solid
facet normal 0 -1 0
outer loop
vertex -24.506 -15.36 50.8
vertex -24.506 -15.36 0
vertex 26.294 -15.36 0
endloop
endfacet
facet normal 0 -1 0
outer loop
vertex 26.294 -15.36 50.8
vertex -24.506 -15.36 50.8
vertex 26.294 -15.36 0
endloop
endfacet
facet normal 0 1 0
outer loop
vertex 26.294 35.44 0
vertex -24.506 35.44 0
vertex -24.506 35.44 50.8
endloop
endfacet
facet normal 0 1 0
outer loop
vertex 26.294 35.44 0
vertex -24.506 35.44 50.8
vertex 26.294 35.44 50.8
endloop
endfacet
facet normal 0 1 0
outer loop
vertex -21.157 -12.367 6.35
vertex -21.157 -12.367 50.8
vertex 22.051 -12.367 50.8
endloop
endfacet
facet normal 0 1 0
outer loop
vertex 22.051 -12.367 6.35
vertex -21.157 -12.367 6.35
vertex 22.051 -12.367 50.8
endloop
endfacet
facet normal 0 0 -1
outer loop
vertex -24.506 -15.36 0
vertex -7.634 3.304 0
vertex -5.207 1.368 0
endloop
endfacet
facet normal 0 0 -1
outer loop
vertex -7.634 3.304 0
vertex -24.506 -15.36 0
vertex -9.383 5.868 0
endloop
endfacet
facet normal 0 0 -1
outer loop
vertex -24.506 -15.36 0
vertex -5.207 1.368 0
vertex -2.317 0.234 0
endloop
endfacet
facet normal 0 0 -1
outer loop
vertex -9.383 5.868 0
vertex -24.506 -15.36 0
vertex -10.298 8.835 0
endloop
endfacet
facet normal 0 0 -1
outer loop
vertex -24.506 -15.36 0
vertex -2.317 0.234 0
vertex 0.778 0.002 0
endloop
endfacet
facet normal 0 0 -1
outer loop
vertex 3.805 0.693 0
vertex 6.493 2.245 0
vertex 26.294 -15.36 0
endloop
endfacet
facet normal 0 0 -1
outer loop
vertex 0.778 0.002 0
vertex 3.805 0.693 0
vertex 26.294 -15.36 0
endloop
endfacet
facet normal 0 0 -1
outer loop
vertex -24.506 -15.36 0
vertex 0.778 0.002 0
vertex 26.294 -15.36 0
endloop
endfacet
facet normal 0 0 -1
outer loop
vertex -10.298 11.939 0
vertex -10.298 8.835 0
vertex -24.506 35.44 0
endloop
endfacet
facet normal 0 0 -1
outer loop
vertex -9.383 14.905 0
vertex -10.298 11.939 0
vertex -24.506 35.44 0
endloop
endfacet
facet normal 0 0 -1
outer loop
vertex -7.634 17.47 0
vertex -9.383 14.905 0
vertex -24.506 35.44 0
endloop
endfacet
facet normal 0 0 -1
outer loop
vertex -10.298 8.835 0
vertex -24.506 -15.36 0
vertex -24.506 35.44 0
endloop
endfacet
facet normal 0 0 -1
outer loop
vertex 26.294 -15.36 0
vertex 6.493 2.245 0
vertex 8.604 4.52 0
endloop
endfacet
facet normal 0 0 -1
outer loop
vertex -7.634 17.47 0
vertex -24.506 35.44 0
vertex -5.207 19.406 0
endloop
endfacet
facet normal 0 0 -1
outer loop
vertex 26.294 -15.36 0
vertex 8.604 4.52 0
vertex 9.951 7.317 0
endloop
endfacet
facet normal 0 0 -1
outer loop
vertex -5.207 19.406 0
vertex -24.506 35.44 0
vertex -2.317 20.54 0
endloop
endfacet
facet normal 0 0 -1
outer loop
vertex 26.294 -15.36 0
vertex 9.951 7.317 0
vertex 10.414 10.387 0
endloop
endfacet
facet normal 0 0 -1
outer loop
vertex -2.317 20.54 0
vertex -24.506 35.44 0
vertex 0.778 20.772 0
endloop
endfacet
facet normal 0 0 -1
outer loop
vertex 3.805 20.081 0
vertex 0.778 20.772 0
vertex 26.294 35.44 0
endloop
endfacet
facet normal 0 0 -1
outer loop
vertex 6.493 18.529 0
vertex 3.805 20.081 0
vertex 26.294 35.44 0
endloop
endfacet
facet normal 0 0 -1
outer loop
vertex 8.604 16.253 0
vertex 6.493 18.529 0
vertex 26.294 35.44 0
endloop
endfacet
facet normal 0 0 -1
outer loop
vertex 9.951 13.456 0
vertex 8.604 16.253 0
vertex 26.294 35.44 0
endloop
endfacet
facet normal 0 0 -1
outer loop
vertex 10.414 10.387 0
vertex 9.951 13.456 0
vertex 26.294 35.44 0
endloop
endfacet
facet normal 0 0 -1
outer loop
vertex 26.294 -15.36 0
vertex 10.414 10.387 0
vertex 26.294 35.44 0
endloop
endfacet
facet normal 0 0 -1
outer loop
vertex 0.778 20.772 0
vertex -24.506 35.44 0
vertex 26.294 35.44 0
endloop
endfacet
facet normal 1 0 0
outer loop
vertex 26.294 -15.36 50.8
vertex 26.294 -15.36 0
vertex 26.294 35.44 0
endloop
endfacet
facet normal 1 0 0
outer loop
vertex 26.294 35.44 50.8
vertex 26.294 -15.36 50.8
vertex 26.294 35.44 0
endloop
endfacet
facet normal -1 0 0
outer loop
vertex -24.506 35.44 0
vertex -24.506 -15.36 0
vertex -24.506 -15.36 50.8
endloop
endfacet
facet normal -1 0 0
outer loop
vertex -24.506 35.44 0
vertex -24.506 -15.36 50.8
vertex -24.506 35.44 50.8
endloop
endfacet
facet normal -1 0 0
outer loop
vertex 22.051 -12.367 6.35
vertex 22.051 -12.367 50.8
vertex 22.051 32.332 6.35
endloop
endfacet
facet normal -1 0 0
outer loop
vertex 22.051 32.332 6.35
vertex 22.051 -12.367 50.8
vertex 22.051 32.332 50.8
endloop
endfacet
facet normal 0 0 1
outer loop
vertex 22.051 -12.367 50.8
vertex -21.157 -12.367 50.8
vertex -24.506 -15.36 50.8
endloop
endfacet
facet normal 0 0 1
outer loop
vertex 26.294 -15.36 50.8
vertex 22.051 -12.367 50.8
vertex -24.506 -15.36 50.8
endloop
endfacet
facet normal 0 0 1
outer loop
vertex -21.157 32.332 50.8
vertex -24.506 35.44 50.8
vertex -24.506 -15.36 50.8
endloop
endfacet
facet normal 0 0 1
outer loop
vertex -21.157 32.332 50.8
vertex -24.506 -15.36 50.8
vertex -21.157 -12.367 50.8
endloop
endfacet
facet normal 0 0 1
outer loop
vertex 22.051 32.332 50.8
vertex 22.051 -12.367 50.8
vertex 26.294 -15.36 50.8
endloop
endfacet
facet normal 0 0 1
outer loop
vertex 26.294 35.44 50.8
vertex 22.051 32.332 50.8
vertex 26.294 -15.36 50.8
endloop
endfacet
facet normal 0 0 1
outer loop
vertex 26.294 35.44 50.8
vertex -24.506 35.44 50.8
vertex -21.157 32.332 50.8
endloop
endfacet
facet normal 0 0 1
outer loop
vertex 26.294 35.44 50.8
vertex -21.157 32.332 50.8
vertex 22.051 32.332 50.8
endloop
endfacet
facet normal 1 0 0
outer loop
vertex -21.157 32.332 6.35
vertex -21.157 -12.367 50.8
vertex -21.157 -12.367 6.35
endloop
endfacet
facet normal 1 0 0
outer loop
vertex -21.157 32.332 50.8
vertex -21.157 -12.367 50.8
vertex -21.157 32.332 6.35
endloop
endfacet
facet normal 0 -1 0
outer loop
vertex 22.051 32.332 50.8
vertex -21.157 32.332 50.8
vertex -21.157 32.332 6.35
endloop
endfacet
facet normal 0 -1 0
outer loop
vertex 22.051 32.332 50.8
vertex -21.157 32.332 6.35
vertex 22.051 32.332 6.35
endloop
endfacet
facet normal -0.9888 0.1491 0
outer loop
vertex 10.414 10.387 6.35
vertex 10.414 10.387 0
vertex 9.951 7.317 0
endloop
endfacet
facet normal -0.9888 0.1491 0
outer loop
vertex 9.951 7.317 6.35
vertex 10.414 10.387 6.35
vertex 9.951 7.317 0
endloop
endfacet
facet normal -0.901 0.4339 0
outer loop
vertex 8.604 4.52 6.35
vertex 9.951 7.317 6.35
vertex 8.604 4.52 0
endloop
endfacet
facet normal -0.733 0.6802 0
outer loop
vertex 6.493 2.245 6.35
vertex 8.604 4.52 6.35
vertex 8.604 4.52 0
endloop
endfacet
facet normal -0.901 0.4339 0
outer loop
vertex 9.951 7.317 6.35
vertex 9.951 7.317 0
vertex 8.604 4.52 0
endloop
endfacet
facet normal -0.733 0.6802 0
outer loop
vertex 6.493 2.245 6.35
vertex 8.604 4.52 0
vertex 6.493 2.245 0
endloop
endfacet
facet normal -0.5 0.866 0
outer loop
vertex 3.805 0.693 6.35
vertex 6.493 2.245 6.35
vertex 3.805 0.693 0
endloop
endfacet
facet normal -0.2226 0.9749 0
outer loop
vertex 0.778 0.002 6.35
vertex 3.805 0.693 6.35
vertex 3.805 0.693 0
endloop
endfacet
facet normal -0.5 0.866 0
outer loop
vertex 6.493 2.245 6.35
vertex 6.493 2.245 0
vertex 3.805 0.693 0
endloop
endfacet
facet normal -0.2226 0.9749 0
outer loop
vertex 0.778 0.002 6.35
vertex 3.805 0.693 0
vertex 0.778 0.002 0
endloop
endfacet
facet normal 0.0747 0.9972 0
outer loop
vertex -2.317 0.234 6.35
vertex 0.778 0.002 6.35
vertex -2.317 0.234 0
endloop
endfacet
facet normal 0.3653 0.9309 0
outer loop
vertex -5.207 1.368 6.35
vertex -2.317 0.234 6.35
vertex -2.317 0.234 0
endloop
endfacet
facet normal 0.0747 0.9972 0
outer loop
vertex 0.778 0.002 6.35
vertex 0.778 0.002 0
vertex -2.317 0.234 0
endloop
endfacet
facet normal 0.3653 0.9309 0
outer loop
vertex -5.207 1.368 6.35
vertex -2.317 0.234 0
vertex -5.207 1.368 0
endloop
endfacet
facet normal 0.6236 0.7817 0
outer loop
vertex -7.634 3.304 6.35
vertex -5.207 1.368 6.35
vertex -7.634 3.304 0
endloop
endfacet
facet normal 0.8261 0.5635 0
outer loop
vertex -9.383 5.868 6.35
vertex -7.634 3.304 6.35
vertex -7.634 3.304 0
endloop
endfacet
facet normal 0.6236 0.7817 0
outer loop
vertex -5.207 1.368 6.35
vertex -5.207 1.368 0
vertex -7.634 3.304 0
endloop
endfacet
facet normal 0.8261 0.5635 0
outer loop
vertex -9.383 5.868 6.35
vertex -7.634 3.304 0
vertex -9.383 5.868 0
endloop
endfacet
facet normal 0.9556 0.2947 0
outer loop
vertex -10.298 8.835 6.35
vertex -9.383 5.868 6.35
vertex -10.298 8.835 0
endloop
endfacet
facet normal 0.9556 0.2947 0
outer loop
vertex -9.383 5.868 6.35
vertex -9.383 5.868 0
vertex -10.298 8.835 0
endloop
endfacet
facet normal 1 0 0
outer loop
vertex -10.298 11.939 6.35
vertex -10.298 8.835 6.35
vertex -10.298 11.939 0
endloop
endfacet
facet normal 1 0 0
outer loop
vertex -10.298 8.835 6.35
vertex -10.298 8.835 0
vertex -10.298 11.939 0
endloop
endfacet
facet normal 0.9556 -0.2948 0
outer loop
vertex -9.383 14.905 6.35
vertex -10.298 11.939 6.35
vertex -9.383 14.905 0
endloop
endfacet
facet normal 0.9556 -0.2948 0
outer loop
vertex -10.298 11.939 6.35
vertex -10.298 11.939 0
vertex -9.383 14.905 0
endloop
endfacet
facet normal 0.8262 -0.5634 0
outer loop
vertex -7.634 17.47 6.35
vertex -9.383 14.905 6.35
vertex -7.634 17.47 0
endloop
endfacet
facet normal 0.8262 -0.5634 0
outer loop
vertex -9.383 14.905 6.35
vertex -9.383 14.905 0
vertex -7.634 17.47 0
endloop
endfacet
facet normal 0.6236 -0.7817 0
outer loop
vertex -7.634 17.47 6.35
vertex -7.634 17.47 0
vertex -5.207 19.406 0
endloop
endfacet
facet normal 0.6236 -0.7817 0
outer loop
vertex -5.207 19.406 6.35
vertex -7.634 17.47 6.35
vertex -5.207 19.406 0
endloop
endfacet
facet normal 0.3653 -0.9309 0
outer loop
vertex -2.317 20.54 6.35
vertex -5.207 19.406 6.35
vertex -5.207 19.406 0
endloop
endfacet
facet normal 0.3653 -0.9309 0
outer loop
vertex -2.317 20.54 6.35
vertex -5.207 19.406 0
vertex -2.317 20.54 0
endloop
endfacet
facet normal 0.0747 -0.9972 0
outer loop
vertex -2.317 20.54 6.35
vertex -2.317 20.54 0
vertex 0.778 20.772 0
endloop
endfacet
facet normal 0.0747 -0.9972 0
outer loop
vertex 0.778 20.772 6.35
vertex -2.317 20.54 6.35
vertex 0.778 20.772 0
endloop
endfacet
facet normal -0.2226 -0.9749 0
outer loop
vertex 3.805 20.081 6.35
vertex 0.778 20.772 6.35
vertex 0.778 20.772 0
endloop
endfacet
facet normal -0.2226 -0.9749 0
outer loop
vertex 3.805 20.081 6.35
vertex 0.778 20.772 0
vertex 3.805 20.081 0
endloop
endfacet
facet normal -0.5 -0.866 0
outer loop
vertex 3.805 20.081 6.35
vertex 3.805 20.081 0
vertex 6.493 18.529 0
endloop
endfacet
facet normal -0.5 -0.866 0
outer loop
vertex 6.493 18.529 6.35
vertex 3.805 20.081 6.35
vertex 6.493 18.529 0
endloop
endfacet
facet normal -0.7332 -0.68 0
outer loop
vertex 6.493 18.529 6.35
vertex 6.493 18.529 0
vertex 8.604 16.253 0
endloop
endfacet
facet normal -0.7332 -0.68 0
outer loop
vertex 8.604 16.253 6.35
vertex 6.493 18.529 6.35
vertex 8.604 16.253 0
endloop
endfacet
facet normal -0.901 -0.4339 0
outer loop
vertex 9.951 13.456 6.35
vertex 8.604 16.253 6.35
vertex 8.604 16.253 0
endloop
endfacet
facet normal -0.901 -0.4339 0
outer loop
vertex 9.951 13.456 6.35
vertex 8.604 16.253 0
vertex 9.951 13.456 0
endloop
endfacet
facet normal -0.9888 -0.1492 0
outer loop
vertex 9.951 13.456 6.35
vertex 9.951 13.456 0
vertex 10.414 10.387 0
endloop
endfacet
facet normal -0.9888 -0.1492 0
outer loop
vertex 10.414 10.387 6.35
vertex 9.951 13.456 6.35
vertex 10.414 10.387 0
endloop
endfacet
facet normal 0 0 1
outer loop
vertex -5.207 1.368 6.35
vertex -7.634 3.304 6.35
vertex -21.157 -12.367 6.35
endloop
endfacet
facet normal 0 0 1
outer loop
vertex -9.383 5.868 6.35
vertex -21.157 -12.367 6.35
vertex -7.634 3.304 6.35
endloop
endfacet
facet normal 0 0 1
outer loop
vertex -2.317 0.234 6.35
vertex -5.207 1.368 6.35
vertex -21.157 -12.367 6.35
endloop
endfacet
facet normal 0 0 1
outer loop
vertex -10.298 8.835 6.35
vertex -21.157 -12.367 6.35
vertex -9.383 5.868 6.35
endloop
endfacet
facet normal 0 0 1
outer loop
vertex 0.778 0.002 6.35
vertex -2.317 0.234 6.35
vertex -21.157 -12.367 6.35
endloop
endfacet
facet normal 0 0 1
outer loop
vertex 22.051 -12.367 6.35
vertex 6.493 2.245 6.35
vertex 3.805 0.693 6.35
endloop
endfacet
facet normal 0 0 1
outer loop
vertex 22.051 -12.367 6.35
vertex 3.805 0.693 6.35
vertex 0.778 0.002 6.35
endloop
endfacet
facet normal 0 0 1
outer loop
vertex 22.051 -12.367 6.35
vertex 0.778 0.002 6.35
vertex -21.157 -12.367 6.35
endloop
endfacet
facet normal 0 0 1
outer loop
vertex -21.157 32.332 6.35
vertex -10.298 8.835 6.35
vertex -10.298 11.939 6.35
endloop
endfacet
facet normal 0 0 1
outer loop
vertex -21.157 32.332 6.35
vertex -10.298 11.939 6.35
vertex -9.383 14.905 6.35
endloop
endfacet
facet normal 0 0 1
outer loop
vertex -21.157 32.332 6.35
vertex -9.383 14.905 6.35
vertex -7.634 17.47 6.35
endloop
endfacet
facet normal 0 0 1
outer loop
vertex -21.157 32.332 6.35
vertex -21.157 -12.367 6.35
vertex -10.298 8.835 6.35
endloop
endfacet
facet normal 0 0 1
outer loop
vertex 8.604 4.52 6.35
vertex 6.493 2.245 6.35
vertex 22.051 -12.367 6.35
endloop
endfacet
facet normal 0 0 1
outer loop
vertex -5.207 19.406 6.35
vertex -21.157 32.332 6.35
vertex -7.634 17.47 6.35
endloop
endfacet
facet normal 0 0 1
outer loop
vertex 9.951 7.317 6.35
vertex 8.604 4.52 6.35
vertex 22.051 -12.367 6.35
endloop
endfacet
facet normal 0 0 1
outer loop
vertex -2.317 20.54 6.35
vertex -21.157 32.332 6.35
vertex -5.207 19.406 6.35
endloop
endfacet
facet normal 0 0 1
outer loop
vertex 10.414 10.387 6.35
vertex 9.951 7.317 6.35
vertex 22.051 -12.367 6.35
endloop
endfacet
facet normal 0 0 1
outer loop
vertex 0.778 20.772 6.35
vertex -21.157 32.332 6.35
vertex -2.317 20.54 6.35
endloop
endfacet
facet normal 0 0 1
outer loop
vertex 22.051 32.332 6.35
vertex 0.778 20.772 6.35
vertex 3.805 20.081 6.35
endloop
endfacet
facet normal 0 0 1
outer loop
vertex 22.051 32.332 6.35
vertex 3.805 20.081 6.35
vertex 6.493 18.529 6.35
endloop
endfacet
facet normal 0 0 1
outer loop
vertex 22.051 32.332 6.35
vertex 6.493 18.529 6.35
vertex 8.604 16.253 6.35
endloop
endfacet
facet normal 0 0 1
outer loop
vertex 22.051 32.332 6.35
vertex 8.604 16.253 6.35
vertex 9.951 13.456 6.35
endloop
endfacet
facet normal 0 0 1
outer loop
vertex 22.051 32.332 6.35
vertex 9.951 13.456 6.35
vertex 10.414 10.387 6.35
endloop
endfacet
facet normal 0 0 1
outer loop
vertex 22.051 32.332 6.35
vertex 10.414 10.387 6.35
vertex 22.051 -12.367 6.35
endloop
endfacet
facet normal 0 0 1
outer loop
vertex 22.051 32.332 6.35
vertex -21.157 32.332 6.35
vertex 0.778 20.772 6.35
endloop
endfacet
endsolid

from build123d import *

# Parameters (mm, degrees)
F0_W     = 50.8
F0_H     = 50.8
F1_DEPTH = 50.8
F2_W     = 43.208381
F2_H     = 44.698323
F3_DEPTH = 44.45
F4_R     = 10.414
F5_DEPTH = 50.801


with BuildPart() as f1:
    # F0 (on Top) → F1 (new body)
    with BuildSketch(Plane.XY):
        with Locations((0.893969, 10.03982)):
            Rectangle(F0_W, F0_H)
    extrude(amount=F1_DEPTH)

    # F2 (on face) → F3 (cut)
    with BuildSketch(Plane.XY.offset(50.8)):
        with Locations((0.446981, 9.982625)):
            Rectangle(F2_W, F2_H)
    extrude(amount=-F3_DEPTH, mode=Mode.SUBTRACT)

    # F4 (on face) → F5 (cut, through all)
    with BuildSketch(Plane(origin=(0, 0, 0), x_dir=(1, 0, 0), z_dir=(0, 0, -1))):
        with Locations((0, -10.386877)):
            Circle(F4_R)
    extrude(amount=-F5_DEPTH, mode=Mode.SUBTRACT)


solid = f1.part
